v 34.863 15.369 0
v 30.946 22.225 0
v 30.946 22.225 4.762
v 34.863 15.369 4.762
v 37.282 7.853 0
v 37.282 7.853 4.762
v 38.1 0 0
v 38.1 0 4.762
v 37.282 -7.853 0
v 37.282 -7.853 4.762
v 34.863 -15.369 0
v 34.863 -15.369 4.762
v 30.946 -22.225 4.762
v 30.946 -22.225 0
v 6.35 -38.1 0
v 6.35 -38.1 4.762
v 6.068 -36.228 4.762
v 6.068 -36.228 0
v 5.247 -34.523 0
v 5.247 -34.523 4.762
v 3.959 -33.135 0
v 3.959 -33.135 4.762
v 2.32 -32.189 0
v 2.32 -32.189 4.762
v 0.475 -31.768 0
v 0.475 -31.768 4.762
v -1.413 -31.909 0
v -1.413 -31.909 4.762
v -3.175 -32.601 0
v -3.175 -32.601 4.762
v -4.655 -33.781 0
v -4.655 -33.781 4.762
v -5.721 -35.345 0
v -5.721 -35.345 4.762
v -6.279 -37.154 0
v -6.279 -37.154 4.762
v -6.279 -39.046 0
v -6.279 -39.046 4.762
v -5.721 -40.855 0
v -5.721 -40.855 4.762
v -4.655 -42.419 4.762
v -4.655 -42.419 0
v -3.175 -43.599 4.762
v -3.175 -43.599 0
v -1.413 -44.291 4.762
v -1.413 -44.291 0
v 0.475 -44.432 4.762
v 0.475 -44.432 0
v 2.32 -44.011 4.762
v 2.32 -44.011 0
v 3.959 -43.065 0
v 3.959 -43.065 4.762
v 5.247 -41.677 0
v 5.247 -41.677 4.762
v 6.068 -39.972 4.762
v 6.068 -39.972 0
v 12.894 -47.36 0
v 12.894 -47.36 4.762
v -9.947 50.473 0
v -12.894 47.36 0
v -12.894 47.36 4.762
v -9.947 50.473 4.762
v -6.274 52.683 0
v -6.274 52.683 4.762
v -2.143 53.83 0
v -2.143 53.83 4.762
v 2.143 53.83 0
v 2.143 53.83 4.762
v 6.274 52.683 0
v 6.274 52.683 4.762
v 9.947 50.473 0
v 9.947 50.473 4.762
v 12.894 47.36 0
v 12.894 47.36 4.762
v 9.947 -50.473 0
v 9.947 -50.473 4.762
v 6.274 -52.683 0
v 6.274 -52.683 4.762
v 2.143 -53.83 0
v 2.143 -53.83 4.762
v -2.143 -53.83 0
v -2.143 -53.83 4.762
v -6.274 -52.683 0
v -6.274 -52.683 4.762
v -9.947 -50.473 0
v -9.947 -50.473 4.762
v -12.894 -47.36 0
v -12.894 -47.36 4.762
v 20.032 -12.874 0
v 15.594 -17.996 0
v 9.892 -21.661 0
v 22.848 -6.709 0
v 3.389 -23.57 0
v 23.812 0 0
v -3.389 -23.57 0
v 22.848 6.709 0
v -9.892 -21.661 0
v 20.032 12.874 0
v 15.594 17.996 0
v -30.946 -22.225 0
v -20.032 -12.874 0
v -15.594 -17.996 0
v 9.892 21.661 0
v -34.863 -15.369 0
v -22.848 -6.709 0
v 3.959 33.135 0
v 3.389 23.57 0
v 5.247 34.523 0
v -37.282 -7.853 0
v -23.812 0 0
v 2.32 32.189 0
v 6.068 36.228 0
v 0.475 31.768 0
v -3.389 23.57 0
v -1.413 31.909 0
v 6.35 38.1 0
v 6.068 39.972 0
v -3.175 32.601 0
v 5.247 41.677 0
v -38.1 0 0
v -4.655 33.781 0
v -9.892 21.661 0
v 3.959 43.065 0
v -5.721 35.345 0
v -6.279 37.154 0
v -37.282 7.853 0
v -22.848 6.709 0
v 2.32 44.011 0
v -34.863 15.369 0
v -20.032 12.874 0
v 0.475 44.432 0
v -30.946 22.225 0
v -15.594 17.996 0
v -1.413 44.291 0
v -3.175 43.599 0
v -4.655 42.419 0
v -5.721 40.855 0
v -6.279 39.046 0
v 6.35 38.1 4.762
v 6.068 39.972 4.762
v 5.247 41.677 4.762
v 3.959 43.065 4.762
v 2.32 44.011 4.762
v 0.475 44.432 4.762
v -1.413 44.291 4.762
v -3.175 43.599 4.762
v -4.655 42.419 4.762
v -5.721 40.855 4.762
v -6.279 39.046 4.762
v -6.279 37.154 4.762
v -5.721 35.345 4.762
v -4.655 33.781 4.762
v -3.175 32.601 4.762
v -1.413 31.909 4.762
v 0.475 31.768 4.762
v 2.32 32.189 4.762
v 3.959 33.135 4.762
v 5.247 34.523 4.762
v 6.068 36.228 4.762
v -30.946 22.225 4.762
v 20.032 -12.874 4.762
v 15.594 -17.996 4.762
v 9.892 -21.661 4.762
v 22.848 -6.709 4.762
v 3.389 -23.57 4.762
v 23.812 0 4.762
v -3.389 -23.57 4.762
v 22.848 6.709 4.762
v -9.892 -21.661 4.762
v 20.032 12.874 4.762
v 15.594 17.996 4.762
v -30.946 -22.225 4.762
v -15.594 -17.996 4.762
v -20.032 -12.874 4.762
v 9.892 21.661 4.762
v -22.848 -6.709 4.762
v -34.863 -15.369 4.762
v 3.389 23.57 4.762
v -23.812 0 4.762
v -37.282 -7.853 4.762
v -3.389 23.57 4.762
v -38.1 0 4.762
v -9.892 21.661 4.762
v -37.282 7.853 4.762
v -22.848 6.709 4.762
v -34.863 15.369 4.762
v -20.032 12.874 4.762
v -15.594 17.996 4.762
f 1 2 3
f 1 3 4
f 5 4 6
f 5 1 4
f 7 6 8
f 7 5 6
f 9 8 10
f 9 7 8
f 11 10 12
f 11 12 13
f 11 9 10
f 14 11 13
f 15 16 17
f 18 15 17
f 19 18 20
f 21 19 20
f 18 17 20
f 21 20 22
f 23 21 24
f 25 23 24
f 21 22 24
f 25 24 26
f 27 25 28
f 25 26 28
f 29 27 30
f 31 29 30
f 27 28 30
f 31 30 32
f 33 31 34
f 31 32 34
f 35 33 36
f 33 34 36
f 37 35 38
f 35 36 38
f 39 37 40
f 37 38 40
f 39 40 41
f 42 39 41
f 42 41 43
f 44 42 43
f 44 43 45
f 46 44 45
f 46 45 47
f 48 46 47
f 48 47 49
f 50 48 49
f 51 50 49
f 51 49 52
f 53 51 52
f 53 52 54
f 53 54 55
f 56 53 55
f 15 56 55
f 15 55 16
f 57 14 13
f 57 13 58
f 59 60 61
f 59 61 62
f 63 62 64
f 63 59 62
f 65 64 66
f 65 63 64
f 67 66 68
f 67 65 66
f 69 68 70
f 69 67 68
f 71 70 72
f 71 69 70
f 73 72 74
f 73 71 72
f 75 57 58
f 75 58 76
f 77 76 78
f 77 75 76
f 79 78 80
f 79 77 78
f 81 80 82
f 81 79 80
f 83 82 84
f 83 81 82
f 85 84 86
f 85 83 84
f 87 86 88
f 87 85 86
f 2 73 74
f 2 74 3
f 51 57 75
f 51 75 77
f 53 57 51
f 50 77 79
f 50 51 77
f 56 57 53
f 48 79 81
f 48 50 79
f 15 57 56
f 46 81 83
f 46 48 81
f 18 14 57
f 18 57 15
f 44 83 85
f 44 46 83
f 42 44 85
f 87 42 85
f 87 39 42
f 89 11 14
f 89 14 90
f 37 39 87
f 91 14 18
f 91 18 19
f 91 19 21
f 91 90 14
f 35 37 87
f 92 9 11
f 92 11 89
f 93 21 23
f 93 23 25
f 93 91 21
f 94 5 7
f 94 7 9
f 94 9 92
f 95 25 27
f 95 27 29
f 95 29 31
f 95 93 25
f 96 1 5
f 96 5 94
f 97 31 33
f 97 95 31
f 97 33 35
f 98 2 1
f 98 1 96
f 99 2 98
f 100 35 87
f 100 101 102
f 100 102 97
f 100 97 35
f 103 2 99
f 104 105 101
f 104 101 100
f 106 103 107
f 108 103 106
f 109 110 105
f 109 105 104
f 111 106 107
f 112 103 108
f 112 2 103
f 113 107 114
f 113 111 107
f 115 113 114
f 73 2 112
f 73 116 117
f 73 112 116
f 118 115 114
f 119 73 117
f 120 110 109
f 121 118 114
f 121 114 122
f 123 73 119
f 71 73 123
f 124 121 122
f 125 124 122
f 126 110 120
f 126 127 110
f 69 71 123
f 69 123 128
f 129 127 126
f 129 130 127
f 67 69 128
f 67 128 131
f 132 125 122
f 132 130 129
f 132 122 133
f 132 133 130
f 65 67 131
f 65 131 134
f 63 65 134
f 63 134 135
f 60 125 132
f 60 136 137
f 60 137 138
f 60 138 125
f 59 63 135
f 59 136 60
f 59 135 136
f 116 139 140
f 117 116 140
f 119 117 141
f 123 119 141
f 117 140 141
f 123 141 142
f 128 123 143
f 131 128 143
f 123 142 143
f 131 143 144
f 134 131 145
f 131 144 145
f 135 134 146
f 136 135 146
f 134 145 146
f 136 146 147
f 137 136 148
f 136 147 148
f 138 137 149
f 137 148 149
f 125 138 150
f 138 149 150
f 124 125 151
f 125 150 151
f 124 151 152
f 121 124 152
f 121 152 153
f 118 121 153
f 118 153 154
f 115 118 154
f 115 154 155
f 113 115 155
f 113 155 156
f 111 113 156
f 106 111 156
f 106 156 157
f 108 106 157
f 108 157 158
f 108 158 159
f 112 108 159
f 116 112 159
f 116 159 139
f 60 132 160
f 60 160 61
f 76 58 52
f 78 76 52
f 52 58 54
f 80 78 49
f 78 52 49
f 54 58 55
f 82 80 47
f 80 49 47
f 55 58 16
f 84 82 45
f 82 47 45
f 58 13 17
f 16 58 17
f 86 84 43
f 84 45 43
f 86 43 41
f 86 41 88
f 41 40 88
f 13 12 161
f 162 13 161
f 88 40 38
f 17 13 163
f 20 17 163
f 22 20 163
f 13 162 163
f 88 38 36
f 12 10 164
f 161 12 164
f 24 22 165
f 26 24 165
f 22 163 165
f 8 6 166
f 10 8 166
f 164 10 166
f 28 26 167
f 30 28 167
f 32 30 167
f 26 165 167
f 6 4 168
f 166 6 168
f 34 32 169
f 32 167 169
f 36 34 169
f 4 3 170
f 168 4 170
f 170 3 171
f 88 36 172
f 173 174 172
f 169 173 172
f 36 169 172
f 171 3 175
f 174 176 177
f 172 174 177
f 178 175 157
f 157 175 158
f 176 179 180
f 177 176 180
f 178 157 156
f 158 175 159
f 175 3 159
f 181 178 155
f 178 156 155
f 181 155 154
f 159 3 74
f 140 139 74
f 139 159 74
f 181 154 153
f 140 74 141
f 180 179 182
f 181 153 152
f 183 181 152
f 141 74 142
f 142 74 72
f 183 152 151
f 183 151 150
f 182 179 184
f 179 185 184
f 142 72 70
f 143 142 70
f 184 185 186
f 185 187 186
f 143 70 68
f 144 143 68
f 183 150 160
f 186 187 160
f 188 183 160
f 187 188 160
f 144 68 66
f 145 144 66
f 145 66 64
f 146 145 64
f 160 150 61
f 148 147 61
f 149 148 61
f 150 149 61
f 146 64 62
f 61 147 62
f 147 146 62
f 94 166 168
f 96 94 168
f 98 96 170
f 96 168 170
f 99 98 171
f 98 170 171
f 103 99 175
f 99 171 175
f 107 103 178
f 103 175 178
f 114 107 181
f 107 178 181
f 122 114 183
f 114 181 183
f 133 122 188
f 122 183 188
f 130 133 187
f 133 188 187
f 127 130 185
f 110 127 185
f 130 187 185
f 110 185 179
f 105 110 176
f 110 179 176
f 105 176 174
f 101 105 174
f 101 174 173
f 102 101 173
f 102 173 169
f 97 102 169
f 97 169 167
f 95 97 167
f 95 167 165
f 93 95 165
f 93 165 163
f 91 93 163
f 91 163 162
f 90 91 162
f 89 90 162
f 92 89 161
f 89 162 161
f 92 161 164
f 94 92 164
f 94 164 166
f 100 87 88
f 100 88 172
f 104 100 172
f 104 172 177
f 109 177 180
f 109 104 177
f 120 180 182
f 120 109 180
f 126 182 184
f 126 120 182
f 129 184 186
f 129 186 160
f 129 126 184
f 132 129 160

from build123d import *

# Parameters (mm, degrees)
MAIN_DEPTH  = 4.7625
SKETCH2_R   = 6.35
SKETCH2_R_2 = 23.8125
HOLES_DEPTH = 67.238901193


with BuildPart() as part:
    # Sketch1 → Main (new body)
    with BuildSketch(Plane.XY):
        with BuildLine():
            Line((12.894196685, 47.360416667), (30.946072045, 22.225))
            ThreePointArc((30.946072045, 22.225), (38.1, 0), (30.946072045, -22.225))
            Line((30.946072045, -22.225), (12.894196685, -47.360416667))
            ThreePointArc((12.894196685, -47.360416667), (0, -53.975), (-12.894196685, -47.360416667))
            Line((-12.894196685, -47.360416667), (-30.946072045, -22.225))
            ThreePointArc((-30.946072045, -22.225), (-38.1, 0), (-30.946072045, 22.225))
            Line((-30.946072045, 22.225), (-12.894196685, 47.360416667))
            ThreePointArc((-12.894196685, 47.360416667), (0, 53.975), (12.894196685, 47.360416667))
        make_face()
    extrude(amount=MAIN_DEPTH)

    # Sketch2 → Holes (cut, through all)
    with BuildSketch(Plane.XY.offset(4.7625)):
        with Locations((0, 38.1)):
            Circle(SKETCH2_R)
        with Locations((0, -38.1)):
            Circle(SKETCH2_R)
        Circle(SKETCH2_R_2)
    extrude(amount=-HOLES_DEPTH, mode=Mode.SUBTRACT)


solid = part.part
